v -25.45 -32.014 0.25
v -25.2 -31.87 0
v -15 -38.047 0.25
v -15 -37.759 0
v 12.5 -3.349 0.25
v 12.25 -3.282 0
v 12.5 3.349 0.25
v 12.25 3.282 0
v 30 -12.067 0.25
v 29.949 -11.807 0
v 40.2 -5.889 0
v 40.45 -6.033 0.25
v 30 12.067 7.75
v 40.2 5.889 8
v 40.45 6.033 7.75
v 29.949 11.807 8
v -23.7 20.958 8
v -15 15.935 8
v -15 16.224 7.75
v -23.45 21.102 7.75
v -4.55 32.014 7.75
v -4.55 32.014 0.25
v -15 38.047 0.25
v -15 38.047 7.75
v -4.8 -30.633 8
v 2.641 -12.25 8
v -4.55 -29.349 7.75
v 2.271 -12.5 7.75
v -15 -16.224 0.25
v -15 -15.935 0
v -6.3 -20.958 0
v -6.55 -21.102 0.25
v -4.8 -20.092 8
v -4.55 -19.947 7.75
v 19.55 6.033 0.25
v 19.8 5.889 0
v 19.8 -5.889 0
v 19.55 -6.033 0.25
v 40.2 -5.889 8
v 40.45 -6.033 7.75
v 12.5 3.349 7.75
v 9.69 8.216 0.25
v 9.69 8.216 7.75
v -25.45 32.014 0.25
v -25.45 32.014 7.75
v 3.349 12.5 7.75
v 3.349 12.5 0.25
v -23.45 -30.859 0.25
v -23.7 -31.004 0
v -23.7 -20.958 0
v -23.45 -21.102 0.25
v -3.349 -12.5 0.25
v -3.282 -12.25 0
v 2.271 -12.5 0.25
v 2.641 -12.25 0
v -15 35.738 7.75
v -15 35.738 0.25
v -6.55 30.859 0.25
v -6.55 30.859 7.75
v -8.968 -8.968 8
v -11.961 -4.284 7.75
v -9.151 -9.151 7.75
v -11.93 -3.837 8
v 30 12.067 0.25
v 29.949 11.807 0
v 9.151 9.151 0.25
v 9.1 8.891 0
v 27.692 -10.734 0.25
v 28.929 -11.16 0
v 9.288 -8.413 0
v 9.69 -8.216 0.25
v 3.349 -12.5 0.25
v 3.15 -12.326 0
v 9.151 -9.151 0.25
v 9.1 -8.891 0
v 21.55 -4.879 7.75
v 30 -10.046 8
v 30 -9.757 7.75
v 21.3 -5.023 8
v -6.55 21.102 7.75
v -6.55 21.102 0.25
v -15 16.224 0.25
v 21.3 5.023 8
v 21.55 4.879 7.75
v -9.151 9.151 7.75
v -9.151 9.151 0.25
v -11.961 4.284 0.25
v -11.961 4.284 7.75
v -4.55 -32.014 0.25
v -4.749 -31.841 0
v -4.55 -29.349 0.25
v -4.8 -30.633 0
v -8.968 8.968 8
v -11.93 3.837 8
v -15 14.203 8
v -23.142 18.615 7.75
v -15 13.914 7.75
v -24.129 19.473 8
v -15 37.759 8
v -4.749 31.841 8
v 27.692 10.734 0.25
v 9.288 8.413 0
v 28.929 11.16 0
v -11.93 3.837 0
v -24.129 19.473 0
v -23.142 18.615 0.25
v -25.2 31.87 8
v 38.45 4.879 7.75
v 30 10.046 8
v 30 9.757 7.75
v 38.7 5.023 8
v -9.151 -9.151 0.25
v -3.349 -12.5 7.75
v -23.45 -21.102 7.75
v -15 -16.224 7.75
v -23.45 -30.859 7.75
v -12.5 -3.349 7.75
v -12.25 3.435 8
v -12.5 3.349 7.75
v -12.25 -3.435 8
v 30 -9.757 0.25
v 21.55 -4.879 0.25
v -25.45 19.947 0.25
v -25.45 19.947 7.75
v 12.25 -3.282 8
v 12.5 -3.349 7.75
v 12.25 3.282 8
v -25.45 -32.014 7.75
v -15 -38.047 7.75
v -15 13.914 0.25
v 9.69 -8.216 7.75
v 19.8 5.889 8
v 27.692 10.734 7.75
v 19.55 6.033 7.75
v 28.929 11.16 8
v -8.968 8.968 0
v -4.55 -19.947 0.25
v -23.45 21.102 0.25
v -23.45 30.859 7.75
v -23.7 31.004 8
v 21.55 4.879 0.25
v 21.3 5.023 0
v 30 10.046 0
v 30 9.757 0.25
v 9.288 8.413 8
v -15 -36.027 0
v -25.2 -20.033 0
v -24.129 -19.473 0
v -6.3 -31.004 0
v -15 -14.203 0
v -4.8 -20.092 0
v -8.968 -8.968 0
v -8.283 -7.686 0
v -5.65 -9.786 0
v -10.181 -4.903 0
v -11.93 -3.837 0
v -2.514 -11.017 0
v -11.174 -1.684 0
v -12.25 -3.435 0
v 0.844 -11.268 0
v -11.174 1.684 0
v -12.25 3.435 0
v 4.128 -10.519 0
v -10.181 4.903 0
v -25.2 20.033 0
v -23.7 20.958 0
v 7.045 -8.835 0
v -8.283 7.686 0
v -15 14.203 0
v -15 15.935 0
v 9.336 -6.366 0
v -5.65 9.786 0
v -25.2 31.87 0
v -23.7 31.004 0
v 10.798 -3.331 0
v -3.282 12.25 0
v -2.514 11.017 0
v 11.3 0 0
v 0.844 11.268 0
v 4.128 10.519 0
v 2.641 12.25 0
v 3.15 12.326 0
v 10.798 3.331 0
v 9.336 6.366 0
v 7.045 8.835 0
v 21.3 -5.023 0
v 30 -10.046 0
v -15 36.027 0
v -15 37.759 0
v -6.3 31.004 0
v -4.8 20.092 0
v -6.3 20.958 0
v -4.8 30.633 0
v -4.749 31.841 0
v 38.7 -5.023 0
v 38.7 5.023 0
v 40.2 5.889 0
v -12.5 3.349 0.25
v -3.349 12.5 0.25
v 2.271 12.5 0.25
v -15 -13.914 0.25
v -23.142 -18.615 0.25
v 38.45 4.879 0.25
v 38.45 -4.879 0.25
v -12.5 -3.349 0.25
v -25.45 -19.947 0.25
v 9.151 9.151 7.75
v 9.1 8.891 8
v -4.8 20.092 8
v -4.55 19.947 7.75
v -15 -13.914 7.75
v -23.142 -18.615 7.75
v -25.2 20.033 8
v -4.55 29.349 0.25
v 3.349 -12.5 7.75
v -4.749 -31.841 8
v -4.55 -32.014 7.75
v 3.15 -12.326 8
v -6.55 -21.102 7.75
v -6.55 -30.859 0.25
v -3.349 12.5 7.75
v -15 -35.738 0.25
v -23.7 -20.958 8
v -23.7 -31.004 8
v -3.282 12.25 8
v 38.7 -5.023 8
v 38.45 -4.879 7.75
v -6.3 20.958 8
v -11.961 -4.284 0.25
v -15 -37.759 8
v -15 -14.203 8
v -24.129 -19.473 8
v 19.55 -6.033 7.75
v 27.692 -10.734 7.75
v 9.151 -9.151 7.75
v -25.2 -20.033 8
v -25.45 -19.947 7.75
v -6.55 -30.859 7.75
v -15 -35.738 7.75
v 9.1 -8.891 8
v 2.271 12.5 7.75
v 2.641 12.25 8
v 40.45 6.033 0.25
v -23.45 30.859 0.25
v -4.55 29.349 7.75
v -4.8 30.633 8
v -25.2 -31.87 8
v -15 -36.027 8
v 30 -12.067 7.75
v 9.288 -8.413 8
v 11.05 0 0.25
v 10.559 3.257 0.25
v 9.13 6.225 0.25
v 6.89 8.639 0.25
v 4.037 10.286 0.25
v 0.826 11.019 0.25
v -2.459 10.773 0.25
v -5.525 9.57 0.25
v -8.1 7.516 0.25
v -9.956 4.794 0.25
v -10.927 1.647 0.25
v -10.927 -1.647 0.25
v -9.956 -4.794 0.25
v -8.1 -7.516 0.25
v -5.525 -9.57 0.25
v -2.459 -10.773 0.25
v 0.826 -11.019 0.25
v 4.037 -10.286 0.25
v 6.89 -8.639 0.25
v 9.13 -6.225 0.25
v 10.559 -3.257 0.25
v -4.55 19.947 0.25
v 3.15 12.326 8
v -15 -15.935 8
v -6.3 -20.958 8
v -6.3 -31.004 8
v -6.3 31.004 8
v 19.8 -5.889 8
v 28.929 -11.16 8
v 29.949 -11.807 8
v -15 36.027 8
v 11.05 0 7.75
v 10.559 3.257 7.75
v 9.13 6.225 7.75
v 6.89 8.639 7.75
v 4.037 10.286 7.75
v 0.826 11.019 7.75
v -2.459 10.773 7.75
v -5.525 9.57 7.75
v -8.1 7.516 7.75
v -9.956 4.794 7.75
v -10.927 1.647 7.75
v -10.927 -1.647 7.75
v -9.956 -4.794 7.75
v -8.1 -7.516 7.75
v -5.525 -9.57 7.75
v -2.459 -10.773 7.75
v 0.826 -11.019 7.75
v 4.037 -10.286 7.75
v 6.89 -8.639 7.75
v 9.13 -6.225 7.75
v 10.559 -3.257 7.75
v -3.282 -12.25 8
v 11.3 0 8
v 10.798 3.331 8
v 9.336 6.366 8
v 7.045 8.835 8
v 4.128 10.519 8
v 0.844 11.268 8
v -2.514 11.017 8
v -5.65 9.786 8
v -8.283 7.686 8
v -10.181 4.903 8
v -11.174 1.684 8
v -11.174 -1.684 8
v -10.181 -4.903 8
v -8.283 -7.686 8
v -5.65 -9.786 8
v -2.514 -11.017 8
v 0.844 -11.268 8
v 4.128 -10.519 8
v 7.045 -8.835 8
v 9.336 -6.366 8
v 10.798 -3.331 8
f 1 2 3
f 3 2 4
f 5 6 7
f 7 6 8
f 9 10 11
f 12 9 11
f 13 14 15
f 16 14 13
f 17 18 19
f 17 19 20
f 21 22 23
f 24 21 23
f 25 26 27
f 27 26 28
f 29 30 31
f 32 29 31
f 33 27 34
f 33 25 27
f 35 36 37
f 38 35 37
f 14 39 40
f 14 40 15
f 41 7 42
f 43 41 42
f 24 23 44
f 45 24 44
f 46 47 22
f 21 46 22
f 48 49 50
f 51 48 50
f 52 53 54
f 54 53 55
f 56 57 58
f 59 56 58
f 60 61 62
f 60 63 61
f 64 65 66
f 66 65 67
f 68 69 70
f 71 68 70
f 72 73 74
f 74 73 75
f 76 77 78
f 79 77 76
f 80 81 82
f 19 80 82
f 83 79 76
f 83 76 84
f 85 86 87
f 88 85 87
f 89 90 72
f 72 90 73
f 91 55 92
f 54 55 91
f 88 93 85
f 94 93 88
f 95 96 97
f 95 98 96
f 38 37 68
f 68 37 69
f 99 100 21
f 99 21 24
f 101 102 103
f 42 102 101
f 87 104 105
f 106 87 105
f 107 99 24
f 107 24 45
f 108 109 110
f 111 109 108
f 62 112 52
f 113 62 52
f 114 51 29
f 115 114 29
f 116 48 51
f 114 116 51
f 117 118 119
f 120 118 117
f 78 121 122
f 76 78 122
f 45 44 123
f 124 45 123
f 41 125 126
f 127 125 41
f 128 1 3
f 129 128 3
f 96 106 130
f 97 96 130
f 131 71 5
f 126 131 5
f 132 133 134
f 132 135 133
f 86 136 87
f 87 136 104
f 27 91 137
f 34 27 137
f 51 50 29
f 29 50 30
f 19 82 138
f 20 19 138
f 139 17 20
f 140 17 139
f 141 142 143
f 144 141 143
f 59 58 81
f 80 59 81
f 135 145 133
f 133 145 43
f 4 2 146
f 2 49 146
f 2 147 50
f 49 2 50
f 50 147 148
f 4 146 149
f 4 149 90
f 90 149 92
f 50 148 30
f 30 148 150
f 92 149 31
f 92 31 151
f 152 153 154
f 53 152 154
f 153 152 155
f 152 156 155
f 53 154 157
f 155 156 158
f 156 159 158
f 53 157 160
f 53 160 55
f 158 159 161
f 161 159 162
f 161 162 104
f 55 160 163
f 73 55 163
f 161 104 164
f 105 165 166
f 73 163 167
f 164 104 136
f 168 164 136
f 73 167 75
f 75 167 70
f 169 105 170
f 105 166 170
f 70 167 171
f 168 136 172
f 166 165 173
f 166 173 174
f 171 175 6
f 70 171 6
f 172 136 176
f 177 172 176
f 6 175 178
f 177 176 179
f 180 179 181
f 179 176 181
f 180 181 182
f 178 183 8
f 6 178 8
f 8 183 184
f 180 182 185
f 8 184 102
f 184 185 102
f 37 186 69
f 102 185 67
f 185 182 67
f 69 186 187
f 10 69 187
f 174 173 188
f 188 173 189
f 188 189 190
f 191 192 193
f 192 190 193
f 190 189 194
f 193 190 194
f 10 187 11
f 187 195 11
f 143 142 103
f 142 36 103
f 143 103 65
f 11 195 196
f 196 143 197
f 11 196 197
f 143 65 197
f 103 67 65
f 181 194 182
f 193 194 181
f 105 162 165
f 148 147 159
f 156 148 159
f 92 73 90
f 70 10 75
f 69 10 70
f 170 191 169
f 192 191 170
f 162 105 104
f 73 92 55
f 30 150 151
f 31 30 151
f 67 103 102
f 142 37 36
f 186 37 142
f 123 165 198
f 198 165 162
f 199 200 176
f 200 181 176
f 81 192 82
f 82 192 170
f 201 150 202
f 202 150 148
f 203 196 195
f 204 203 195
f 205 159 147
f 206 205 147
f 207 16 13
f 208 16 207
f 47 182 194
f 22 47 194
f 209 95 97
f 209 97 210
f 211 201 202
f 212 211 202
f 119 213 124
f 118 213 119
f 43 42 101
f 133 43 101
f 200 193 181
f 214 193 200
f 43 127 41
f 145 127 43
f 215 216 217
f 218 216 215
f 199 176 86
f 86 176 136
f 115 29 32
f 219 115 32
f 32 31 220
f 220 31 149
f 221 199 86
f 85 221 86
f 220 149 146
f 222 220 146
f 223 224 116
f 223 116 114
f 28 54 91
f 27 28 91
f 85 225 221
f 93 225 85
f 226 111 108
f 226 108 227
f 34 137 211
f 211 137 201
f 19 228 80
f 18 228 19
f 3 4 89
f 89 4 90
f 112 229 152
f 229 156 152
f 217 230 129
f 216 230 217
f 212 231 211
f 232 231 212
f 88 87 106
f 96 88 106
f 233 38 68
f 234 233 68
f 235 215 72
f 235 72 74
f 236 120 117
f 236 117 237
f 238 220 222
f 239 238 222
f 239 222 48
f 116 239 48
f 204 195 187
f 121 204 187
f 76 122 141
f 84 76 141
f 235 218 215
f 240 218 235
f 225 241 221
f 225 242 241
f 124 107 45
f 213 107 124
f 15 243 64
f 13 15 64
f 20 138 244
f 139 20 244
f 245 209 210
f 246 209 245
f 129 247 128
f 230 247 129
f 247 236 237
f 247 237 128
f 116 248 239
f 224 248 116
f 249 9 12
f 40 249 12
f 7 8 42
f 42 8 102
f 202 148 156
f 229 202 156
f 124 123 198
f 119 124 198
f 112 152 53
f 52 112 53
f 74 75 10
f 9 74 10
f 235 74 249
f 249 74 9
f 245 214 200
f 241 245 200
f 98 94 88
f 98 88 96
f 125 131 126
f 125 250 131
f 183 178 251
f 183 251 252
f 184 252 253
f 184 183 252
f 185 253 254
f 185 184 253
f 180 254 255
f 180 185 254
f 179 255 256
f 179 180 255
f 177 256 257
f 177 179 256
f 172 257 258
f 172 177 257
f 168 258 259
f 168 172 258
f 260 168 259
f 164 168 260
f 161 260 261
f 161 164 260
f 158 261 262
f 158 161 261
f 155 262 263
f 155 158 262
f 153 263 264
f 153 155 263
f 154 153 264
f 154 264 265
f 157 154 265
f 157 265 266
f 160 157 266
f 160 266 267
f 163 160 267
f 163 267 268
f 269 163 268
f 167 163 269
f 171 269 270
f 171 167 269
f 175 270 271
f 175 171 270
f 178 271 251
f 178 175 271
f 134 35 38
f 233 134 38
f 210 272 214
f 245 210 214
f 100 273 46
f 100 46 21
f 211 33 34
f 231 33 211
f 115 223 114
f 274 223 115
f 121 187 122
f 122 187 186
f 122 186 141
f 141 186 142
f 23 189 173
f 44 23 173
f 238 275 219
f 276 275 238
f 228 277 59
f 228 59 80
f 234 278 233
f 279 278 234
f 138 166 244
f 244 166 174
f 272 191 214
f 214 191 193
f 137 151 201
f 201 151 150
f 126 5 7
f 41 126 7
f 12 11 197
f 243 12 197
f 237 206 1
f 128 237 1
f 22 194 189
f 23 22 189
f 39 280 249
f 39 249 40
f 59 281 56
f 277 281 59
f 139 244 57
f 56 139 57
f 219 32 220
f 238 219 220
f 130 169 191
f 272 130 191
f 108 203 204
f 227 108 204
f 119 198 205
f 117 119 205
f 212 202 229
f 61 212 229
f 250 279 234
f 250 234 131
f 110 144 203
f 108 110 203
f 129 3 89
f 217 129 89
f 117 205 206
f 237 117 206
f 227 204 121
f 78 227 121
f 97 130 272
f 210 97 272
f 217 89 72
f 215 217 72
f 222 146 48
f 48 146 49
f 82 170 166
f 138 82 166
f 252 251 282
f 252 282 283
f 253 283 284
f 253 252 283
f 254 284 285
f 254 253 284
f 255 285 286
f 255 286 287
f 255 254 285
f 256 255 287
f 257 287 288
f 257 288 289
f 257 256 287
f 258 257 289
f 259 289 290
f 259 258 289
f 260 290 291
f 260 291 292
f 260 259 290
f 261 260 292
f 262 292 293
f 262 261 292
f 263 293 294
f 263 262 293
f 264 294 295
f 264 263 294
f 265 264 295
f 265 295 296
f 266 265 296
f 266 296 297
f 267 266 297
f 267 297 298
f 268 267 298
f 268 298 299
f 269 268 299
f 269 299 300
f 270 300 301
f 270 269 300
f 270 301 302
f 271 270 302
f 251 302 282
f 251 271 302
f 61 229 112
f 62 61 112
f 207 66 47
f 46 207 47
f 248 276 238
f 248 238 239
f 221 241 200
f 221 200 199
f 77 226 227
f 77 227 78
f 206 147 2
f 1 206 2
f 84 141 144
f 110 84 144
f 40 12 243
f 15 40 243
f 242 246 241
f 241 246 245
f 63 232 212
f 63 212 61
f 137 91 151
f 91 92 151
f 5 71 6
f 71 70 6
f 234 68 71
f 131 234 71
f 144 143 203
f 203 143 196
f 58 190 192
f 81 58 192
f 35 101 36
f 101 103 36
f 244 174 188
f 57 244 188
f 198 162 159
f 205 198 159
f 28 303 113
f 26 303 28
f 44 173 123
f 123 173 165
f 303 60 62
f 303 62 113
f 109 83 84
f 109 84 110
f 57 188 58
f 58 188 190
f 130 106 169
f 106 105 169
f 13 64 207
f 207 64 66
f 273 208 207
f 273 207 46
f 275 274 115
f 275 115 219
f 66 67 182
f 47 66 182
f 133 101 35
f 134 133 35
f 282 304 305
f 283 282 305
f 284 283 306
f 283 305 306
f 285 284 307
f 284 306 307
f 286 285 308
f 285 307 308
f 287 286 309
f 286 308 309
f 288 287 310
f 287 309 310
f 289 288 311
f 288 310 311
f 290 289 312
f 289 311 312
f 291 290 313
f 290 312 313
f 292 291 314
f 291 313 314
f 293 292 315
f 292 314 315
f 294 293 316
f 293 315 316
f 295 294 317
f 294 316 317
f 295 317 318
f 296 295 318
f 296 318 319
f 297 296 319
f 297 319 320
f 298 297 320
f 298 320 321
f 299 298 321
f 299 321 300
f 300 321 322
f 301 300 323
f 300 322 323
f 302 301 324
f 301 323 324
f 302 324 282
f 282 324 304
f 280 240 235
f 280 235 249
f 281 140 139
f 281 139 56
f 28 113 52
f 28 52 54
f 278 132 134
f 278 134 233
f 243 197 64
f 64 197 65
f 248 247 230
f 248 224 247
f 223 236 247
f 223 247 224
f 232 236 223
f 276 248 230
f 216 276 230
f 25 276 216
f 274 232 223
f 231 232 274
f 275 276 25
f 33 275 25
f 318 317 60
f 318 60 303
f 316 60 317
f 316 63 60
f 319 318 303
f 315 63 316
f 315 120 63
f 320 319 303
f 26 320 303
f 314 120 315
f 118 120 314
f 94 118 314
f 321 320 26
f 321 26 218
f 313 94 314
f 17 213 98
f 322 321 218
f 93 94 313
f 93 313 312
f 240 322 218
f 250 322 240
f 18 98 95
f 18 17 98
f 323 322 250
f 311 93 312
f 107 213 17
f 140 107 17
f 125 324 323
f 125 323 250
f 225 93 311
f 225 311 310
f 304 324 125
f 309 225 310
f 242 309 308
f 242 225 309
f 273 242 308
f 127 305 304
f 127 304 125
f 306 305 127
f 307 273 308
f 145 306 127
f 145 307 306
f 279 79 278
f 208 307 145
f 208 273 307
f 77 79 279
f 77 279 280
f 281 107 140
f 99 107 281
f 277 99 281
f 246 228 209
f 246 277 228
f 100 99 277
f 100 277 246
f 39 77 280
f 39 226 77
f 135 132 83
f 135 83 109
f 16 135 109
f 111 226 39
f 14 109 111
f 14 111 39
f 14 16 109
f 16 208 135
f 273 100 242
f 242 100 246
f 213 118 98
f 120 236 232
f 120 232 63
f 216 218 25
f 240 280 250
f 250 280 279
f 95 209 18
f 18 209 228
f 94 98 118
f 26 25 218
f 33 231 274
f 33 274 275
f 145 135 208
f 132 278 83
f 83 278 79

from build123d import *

# Parameters (mm, degrees)
F1_R     = 11.05
F2_DEPTH = 8
F3_SIZE  = 0.25


with BuildPart() as f2:
    # F1 (on Top) → F2 (new body)
    with BuildSketch(Plane.XY):
        Polygon((30, -12.0666206261), (40.45, -6.033310313), (40.45, 6.033310313), (30, 12.0666206261), (27.6919892048, 10.7340899722), (19.55, 6.033310313), (19.55, -6.033310313), (27.6919892048, -10.7340899722), align=None)
        Polygon((21.55, 4.8786097747), (30, 9.7572195493), (38.45, 4.8786097747), (38.45, -4.8786097747), (30, -9.7572195493), (21.55, -4.8786097747), align=None, mode=Mode.SUBTRACT)
        Polygon((9.1506350946, -9.1506350946), (30, -12.0666206261), (27.6919892048, -10.7340899722), (9.6900481732, -8.2163442363), align=None)
        Polygon((27.6919892048, 10.7340899722), (30, 12.0666206261), (9.1506350946, 9.1506350946), (9.6900481732, 8.2163442363), align=None)
        Polygon((3.3493649054, -12.5), (9.1506350946, -9.1506350946), (9.6900481732, -8.2163442363), (12.5, -3.3493649054), (12.5, 3.3493649054), (9.6900481732, 8.2163442363), (9.1506350946, 9.1506350946), (3.3493649054, 12.5), (2.2705387483, 12.5), (-3.3493649054, 12.5), (-9.1506350946, 9.1506350946), (-11.9605869214, 4.2836557637), (-12.5, 3.3493649054), (-12.5, -3.3493649054), (-11.9605869214, -4.2836557637), (-9.1506350946, -9.1506350946), (-3.3493649054, -12.5), (2.2705387483, -12.5), align=None)
        Circle(F1_R, mode=Mode.SUBTRACT)
        Polygon((-4.55, -32.0140724266), (3.3493649054, -12.5), (2.2705387483, -12.5), (-4.55, -29.3490111188), align=None)
        Polygon((2.2705387483, 12.5), (3.3493649054, 12.5), (-4.55, 32.0140724266), (-4.55, 29.3490111188), align=None)
        Polygon((-15, -38.0473827396), (-4.55, -32.0140724266), (-4.55, -29.3490111188), (-4.55, -19.9474518005), (-15, -13.9141414875), (-23.1419892048, -18.6149211466), (-25.45, -19.9474518005), (-25.45, -32.0140724266), align=None)
        Polygon((-23.45, -21.1021523389), (-15, -16.2235425642), (-6.55, -21.1021523389), (-6.55, -30.8593718882), (-15, -35.7379816628), (-23.45, -30.8593718882), align=None, mode=Mode.SUBTRACT)
        Polygon((-4.55, 29.3490111188), (-4.55, 32.0140724266), (-15, 38.0473827396), (-25.45, 32.0140724266), (-25.45, 19.9474518005), (-23.1419892048, 18.6149211466), (-15, 13.9141414875), (-4.55, 19.9474518005), align=None)
        Polygon((-6.55, 30.8593718882), (-6.55, 21.1021523389), (-15, 16.2235425642), (-23.45, 21.1021523389), (-23.45, 30.8593718882), (-15, 35.7379816628), align=None, mode=Mode.SUBTRACT)
        Polygon((-23.1419892048, -18.6149211466), (-11.9605869214, -4.2836557637), (-12.5, -3.3493649054), (-25.45, -19.9474518005), align=None)
        Polygon((-12.5, 3.3493649054), (-11.9605869214, 4.2836557637), (-23.1419892048, 18.6149211466), (-25.45, 19.9474518005), align=None)
    extrude(amount=F2_DEPTH)

    # F3
    f3_edges = [f2.edges().sort_by_distance(p)[0] for p in [
        (35.225, -9.049965, 0),
        (40.45, 0, 0),
        (35.225, 9.049965, 0),
        (19.575318, 10.608628, 0),
        (6.25, 10.825318, 0),
        (-0.600318, 22.257036, 0),
        (-9.775, 35.030728, 0),
        (-20.225, 35.030728, 0),
        (-25.45, 25.980762, 0),
        (-18.975, 11.648408, 0),
        (-12.5, 0, 0),
        (-18.975, -11.648408, 0),
        (-25.45, -25.980762, 0),
        (-20.225, -35.030728, 0),
        (-9.775, -35.030728, 0),
        (-0.600318, -22.257036, 0),
        (6.25, -10.825318, 0),
        (19.575318, -10.608628, 0),
        (-19.070995, 16.264531, 0),
        (-9.775, 16.930797, 0),
        (-4.55, 24.648231, 0),
        (-1.139731, 20.924506, 0),
        (-0.539413, 12.5, 0),
        (-6.25, 10.825318, 0),
        (-10.555611, 6.717145, 0),
        (-17.551288, 11.449288, 0),
        (-10.555611, -6.717145, 0),
        (-6.25, -10.825318, 0),
        (-0.539413, -12.5, 0),
        (-1.139731, -20.924506, 0),
        (-4.55, -24.648231, 0),
        (-9.775, -16.930797, 0),
        (-19.070995, -16.264531, 0),
        (-17.551288, -11.449288, 0),
        (18.691019, 9.475217, 0),
        (23.620995, 8.3837, 0),
        (19.55, 0, 0),
        (23.620995, -8.3837, 0),
        (18.691019, -9.475217, 0),
        (11.095024, -5.782855, 0),
        (12.5, 0, 0),
        (11.095024, 5.782855, 0),
        (25.775, -7.317915, 0),
        (21.55, 0, 0),
        (25.775, 7.317915, 0),
        (34.225, 7.317915, 0),
        (38.45, 0, 0),
        (34.225, -7.317915, 0),
        (-11.05, 0, 0),
        (-23.45, -25.980762, 0),
        (-19.225, -18.662847, 0),
        (-10.775, -18.662847, 0),
        (-6.55, -25.980762, 0),
        (-10.775, -33.298677, 0),
        (-19.225, -33.298677, 0),
        (-19.225, 33.298677, 0),
        (-10.775, 33.298677, 0),
        (-6.55, 25.980762, 0),
        (-10.775, 18.662847, 0),
        (-19.225, 18.662847, 0),
        (-23.45, 25.980762, 0),
        (35.225, -9.049965, 8),
        (40.45, 0, 8),
        (35.225, 9.049965, 8),
        (19.575318, 10.608628, 8),
        (6.25, 10.825318, 8),
        (-0.600318, 22.257036, 8),
        (-9.775, 35.030728, 8),
        (-20.225, 35.030728, 8),
        (-25.45, 25.980762, 8),
        (-18.975, 11.648408, 8),
        (-12.5, 0, 8),
        (-18.975, -11.648408, 8),
        (-25.45, -25.980762, 8),
        (-20.225, -35.030728, 8),
        (-9.775, -35.030728, 8),
        (-0.600318, -22.257036, 8),
        (6.25, -10.825318, 8),
        (19.575318, -10.608628, 8),
        (-19.070995, 16.264531, 8),
        (-9.775, 16.930797, 8),
        (-4.55, 24.648231, 8),
        (-1.139731, 20.924506, 8),
        (-0.539413, 12.5, 8),
        (-6.25, 10.825318, 8),
        (-10.555611, 6.717145, 8),
        (-17.551288, 11.449288, 8),
        (-10.555611, -6.717145, 8),
        (-6.25, -10.825318, 8),
        (-0.539413, -12.5, 8),
        (-1.139731, -20.924506, 8),
        (-4.55, -24.648231, 8),
        (-9.775, -16.930797, 8),
        (-19.070995, -16.264531, 8),
        (-17.551288, -11.449288, 8),
        (18.691019, 9.475217, 8),
        (23.620995, 8.3837, 8),
        (19.55, 0, 8),
        (23.620995, -8.3837, 8),
        (18.691019, -9.475217, 8),
        (11.095024, -5.782855, 8),
        (12.5, 0, 8),
        (11.095024, 5.782855, 8),
        (25.775, -7.317915, 8),
        (21.55, 0, 8),
        (25.775, 7.317915, 8),
        (34.225, 7.317915, 8),
        (38.45, 0, 8),
        (34.225, -7.317915, 8),
        (-11.05, 0, 8),
        (-23.45, -25.980762, 8),
        (-19.225, -18.662847, 8),
        (-10.775, -18.662847, 8),
        (-6.55, -25.980762, 8),
        (-10.775, -33.298677, 8),
        (-19.225, -33.298677, 8),
        (-19.225, 33.298677, 8),
        (-10.775, 33.298677, 8),
        (-6.55, 25.980762, 8),
        (-10.775, 18.662847, 8),
        (-19.225, 18.662847, 8),
        (-23.45, 25.980762, 8),
    ]]
    chamfer(f3_edges, length=F3_SIZE)


solid = f2.part
